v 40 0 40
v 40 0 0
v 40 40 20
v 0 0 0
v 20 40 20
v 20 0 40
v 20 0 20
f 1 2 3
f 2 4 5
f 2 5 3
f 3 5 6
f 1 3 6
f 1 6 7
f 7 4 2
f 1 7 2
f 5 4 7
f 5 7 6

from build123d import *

# Parameters (mm, degrees)
SKETCH1_W           = 40
SKETCH1_H           = 40
BOSS_EXTRUDE1_DEPTH = 40
CUT_EXTRUDE1_DEPTH  = 40
CUT_EXTRUDE2_DEPTH  = 40
CUT_EXTRUDE3_DEPTH  = 40
CUT_EXTRUDE4_DEPTH  = 40


with BuildPart() as part:
    # Sketch1 → Boss-Extrude1 (new body)
    with BuildSketch(Plane.XY):
        with Locations((20, 20)):
            Rectangle(SKETCH1_W, SKETCH1_H)
    extrude(amount=BOSS_EXTRUDE1_DEPTH)

    # Sketch2 → Cut-Extrude1 (cut)
    with BuildSketch(Plane.XY.offset(40)):
        Polygon((0, 0), (20, 40), (0, 40), align=None)
    extrude(amount=-CUT_EXTRUDE1_DEPTH, mode=Mode.SUBTRACT)

    # Sketch3 → Cut-Extrude2 (cut)
    with BuildSketch(Plane.XZ):
        Polygon((0, 0), (20, 20), (20, 40), (0, 40), align=None)
    extrude(amount=-CUT_EXTRUDE2_DEPTH, mode=Mode.SUBTRACT)

    # Sketch4 → Cut-Extrude3 (cut)
    with BuildSketch(Plane.ZY.offset(-20)):
        Polygon((20, 40), (40, 0), (40, 40), align=None)
    extrude(amount=-CUT_EXTRUDE3_DEPTH, mode=Mode.SUBTRACT)

    # Sketch5 → Cut-Extrude4 (cut)
    with BuildSketch(Plane(origin=(0, 0, 0), x_dir=(1, 0, 0), z_dir=(0, -0.447213595, 0.894427191))):
        Polygon((0, 0), (40, 0), (40, 44.72135955), (20, 44.72135955), align=None)
    extrude(amount=-CUT_EXTRUDE4_DEPTH, mode=Mode.SUBTRACT)


solid = part.part
